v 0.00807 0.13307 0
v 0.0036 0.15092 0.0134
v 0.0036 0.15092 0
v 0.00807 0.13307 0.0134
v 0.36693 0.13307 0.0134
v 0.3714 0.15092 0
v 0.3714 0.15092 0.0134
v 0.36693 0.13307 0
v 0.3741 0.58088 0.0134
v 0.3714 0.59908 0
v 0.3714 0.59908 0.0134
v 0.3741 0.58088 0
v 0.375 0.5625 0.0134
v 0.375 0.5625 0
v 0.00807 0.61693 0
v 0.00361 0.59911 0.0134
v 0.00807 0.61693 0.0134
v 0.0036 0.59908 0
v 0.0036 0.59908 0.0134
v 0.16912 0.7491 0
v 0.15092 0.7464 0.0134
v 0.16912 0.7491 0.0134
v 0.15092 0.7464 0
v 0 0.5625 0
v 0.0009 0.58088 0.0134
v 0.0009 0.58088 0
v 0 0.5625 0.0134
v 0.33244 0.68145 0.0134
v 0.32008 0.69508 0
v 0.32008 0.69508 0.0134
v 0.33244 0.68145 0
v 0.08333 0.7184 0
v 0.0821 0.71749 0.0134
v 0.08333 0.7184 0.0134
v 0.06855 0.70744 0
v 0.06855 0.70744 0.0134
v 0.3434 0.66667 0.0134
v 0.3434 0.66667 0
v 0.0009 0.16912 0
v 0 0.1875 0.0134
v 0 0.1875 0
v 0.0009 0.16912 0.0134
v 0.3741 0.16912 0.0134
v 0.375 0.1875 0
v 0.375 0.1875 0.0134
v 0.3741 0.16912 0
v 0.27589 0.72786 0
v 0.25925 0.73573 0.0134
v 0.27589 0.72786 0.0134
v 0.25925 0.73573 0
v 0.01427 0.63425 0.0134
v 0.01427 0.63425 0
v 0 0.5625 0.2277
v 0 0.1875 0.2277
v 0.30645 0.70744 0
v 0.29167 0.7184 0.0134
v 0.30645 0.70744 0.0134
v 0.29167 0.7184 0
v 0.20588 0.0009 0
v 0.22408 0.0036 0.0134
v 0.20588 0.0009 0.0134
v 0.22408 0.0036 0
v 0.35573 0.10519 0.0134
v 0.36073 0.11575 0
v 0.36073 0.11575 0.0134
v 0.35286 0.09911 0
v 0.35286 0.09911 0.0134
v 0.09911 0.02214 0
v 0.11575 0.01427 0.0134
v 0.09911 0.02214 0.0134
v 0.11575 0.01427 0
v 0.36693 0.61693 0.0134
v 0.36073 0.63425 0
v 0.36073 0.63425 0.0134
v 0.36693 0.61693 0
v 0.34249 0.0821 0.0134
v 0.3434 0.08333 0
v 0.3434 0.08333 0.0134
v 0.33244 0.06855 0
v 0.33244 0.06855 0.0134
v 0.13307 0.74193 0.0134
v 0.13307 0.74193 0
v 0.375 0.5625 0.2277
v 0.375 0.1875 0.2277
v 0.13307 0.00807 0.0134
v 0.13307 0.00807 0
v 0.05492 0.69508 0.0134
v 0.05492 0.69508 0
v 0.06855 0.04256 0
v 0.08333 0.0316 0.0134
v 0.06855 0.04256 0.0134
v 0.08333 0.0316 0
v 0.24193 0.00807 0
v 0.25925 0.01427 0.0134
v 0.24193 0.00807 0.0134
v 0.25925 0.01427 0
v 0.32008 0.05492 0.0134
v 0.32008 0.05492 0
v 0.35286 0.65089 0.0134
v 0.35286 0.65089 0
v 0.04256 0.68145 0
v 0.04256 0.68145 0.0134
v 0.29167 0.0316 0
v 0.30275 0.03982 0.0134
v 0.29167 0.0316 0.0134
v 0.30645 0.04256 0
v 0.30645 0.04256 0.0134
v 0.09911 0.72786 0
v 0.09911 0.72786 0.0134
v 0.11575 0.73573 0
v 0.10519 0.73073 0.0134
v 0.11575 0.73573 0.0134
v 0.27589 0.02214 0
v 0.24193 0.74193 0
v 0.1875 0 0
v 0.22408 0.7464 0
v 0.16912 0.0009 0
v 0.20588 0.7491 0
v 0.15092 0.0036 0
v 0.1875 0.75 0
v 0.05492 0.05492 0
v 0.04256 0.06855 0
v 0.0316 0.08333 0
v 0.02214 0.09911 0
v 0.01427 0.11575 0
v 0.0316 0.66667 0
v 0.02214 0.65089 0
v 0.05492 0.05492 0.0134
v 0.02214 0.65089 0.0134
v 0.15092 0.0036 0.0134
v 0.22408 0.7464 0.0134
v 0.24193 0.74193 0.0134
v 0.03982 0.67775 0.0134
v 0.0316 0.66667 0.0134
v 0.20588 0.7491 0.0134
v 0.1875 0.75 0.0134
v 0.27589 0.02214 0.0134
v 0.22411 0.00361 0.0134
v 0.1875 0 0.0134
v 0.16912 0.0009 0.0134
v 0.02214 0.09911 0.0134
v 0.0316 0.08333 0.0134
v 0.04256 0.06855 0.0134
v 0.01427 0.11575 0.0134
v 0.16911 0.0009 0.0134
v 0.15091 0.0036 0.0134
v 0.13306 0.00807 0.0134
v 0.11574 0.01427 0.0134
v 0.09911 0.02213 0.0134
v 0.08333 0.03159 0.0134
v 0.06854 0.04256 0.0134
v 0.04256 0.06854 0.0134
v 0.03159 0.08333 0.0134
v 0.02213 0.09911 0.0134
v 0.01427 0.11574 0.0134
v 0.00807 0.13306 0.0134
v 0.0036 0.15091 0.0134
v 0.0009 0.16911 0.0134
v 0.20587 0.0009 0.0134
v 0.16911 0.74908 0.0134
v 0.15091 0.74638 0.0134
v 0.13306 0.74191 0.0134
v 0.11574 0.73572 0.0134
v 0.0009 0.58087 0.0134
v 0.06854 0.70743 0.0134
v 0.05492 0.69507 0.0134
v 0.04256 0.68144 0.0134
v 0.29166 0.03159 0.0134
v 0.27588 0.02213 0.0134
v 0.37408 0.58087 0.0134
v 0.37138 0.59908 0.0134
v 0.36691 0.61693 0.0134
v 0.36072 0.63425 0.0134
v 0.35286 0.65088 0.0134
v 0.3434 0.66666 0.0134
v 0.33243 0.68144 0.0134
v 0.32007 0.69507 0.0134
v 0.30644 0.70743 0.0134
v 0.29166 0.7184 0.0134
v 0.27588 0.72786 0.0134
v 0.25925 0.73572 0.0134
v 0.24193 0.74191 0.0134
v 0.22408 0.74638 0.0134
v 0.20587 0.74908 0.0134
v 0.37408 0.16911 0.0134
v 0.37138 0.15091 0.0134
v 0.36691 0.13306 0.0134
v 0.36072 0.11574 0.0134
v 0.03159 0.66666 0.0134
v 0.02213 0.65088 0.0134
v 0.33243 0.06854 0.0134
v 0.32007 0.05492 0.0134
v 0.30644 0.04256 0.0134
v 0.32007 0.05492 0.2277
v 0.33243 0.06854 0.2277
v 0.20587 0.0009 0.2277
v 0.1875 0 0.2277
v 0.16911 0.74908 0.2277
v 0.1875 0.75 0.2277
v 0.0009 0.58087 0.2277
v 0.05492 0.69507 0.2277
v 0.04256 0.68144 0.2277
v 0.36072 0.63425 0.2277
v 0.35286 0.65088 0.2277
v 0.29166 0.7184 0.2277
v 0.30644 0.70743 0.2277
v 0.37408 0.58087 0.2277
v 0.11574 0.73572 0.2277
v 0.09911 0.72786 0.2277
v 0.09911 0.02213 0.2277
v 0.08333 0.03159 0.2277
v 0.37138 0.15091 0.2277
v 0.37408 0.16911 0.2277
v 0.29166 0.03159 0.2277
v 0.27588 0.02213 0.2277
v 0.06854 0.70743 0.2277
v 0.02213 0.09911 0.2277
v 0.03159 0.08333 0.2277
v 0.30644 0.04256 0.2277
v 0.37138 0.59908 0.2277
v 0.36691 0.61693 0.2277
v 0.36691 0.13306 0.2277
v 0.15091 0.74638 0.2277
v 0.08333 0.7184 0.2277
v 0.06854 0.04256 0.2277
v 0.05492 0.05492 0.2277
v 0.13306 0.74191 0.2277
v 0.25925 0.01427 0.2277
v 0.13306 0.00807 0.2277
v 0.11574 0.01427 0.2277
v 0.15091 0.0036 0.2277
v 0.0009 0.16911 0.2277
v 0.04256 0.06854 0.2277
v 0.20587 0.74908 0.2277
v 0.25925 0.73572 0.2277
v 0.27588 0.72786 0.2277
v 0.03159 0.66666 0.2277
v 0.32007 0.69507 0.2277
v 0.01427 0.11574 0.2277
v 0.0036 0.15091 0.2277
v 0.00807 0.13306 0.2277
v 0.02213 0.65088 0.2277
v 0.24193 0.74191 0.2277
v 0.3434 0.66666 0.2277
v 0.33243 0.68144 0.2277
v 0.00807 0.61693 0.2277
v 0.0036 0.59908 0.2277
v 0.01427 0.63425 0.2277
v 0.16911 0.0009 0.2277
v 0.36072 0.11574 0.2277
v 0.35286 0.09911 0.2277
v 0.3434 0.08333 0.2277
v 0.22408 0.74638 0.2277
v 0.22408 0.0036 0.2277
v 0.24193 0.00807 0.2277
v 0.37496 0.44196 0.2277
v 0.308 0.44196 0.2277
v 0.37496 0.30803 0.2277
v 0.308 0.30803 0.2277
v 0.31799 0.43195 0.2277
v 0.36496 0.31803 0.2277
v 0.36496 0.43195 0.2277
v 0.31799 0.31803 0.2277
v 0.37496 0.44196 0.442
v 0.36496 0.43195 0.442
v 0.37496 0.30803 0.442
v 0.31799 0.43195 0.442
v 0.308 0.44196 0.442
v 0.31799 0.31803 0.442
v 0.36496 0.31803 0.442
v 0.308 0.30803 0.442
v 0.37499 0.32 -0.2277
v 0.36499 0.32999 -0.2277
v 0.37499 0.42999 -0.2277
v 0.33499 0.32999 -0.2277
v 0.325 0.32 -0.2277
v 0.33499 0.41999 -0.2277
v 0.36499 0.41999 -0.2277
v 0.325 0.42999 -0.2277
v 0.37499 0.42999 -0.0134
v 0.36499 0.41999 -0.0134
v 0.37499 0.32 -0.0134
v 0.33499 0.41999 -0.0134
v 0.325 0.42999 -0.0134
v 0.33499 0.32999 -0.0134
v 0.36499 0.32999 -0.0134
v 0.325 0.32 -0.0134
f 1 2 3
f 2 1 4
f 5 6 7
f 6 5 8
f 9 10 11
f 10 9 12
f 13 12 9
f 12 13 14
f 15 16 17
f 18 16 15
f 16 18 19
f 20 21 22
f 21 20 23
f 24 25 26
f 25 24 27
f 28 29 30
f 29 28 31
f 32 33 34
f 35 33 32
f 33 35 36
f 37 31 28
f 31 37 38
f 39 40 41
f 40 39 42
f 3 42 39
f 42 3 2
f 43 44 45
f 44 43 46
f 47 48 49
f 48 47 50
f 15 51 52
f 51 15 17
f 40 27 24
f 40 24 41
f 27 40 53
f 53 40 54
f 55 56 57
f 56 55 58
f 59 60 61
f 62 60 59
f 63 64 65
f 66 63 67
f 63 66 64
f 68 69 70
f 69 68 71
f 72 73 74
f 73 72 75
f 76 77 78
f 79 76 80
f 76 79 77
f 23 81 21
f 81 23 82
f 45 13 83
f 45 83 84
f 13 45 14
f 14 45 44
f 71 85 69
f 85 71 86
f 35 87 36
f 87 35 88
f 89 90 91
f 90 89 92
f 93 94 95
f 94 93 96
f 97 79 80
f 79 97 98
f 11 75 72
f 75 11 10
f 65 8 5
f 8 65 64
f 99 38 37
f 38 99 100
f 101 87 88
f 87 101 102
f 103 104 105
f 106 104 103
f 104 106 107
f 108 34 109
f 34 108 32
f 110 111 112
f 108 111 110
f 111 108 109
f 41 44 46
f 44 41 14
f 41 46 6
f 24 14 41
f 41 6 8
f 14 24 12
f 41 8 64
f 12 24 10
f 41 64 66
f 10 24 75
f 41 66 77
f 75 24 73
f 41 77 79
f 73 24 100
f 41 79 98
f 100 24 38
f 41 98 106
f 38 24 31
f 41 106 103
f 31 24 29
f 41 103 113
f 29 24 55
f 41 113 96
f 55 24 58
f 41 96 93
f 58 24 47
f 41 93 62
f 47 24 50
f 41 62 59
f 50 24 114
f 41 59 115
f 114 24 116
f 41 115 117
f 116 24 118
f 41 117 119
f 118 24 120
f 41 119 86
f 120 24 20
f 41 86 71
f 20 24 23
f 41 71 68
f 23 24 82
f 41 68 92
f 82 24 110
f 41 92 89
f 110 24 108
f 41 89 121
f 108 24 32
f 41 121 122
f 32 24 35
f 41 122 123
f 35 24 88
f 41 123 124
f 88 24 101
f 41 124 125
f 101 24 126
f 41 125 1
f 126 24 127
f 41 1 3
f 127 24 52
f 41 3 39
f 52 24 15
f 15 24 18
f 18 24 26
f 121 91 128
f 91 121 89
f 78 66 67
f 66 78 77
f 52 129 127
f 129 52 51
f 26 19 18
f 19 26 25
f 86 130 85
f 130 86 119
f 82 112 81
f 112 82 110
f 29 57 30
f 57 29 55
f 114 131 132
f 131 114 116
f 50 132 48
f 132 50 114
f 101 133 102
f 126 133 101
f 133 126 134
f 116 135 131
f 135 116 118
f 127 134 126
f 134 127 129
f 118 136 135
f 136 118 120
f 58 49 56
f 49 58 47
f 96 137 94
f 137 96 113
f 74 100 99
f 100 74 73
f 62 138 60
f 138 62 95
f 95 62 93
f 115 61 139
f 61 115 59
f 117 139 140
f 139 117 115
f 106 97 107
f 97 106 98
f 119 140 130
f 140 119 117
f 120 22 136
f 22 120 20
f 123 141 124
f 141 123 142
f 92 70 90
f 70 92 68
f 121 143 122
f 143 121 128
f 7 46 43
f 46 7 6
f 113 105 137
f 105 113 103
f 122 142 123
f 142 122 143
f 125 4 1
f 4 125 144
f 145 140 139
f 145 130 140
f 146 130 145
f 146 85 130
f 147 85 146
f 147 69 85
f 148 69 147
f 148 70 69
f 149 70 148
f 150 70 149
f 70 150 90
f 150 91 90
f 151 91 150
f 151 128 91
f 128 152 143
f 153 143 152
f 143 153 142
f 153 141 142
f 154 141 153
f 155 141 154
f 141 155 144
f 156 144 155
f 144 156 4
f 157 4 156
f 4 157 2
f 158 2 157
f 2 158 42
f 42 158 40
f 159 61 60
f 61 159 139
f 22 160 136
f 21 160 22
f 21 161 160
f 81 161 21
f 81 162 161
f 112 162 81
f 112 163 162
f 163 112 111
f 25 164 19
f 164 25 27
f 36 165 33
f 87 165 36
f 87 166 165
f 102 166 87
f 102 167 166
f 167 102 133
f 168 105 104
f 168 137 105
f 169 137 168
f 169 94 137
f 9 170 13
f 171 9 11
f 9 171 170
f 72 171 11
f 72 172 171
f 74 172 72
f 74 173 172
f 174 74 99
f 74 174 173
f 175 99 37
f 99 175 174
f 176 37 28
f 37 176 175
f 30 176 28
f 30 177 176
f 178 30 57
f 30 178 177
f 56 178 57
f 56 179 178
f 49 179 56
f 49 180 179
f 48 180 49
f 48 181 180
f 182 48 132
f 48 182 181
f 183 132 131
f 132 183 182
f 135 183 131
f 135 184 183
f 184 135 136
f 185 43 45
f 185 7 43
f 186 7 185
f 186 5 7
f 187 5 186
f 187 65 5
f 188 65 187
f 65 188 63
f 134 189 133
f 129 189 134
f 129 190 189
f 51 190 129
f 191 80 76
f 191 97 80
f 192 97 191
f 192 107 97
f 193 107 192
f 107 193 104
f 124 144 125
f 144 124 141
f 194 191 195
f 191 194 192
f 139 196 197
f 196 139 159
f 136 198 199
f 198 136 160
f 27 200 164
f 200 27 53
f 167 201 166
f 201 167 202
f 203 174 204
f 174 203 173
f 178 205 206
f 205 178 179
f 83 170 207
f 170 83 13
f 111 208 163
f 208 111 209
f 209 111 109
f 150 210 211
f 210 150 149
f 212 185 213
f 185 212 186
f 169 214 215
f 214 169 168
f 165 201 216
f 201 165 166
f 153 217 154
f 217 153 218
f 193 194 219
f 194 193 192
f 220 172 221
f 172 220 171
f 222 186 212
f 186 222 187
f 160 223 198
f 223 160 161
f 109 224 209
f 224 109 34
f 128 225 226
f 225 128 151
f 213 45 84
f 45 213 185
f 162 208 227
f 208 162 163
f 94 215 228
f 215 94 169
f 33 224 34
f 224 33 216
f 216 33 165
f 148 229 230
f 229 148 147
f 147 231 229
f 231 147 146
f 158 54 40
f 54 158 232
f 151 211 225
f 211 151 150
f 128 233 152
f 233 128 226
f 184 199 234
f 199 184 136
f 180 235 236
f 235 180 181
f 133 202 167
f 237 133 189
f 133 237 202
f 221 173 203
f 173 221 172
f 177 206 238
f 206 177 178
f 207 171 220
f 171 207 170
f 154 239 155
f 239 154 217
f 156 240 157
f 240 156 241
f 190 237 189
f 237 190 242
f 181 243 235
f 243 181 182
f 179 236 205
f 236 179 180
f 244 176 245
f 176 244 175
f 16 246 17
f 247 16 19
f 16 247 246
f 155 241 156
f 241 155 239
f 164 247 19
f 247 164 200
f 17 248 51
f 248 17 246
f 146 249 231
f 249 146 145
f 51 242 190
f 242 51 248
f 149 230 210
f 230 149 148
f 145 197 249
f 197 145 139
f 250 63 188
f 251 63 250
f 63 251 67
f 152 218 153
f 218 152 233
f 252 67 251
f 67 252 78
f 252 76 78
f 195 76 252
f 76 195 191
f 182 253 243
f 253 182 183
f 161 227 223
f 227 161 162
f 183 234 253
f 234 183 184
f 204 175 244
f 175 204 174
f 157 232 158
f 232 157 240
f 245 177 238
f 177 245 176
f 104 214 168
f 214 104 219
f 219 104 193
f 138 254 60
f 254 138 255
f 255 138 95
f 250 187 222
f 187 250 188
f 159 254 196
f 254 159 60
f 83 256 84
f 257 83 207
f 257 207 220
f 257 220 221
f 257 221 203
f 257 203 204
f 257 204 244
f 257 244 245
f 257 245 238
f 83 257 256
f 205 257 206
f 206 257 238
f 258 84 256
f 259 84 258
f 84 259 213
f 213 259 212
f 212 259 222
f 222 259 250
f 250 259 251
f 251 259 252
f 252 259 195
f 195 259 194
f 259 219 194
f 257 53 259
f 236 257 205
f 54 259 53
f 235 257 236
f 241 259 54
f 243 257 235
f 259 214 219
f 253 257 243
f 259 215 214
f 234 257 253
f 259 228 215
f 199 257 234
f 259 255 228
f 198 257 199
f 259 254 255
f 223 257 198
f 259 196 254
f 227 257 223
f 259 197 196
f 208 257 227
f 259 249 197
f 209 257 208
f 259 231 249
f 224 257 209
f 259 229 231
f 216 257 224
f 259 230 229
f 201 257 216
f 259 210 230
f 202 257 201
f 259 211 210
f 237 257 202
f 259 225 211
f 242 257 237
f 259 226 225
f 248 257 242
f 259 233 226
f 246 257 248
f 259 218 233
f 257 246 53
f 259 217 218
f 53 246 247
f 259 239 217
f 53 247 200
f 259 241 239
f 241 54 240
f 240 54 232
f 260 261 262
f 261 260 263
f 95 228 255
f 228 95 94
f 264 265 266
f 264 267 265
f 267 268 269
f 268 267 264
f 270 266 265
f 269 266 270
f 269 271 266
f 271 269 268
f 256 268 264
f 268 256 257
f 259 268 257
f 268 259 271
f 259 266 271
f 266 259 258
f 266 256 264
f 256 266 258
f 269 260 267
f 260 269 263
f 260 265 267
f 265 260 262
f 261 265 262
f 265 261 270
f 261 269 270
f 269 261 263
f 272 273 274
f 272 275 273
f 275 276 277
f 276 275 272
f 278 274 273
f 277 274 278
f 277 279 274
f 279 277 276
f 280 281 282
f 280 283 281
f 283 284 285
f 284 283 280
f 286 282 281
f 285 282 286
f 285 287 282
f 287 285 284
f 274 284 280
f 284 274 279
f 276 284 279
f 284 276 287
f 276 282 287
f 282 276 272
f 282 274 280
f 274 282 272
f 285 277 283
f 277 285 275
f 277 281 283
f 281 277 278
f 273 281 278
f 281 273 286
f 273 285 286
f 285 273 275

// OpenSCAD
// Global Resolution Setting
$fn = 64;

// ==============================
// All Parametric Dimensions
// ==============================
// Base Footprint Specifications
base_len = 0.375;          // Total X dimension of base footprint
base_wid = 0.75;           // Total Y dimension of base footprint
base_corner_r = base_len/2;// Radius for rounded stadium ends
base_thickness = 0.0134;   // Thickness of lower solid base plate

// Upper Perimeter Wall Specifications
main_wall_total_reach = 0.2277;  // Max Z height from base datum (Z=0)
main_wall_thickness = 0.02;      // Wall thickness of upper perimeter
main_wall_height = main_wall_total_reach - base_thickness;

// Raised Upper Sleeve Specifications
sleeve_offset_left = 0.308;      // Offset from base left edge
sleeve_outer_len = 0.066964;     // Sleeve X dimension
sleeve_outer_wid = 0.133929;     // Sleeve Y dimension
sleeve_total_reach = 0.442;      // Max Z height from base datum
sleeve_height = sleeve_total_reach - main_wall_total_reach;
sleeve_wall_thickness = 0.01;    // Wall thickness of hollow sleeve

// Lower Sleeve Continuation Specifications
lower_sleeve_outer_len = 0.05;   // X dimension (fits inside upper sleeve)
lower_sleeve_outer_wid = 0.11;   // Y dimension (fits inside upper sleeve)
lower_sleeve_depth = 0.2143;     // Extrusion depth below base
lower_sleeve_top_z = -0.0134;    // Top Z position (0.0134 below base)

// Circular Cut Hole Specifications
hole_r = 0.0067;                 // Hole radius
hole_x_pos = 0.3616;             // Shared X position for both holes
hole_y_pos1 = 0.6828;            // Y position of upper hole
hole_y_pos2 = 0.0672;            // Y position of lower hole
hole_z_start = 0.1674;           // Start Z height of cuts
hole_z_end = 0.1808;             // End Z height of cuts
hole_height = hole_z_end - hole_z_start;

// ==============================
// Helper Module Definitions
// ==============================
// Generate 2D stadium/rounded footprint for base
module base_footprint(filled=true, wall_thickness=0) {
    hull() {
        translate([base_len/2, base_corner_r, 0]) circle(r=base_corner_r);
        translate([base_len/2, base_wid - base_corner_r, 0]) circle(r=base_corner_r);
    }
    if (!filled) {
        difference() {
            children();
            offset(r=-wall_thickness) children();
        }
    }
}

// Generate 2D hollow rectangular footprint for sleeves
module sleeve_footprint(outer_len, outer_wid, wall_thickness) {
    difference() {
        square([outer_len, outer_wid]);
        translate([wall_thickness, wall_thickness, 0])
            square([outer_len - 2*wall_thickness, outer_wid - 2*wall_thickness]);
    }
}

// ==============================
// Main Model Assembly
// ==============================
difference() {
    union() {
        // Lower solid base plate
        linear_extrude(height=base_thickness)
            base_footprint(filled=true);
        
        // Upper perimeter wall (hollow inner region)
        translate([0, 0, base_thickness])
            linear_extrude(height=main_wall_height)
                base_footprint(filled=false, wall_thickness=main_wall_thickness);
        
        // Raised hollow upper sleeve
        translate([sleeve_offset_left, (base_wid - sleeve_outer_wid)/2, main_wall_total_reach])
            linear_extrude(height=sleeve_height)
                sleeve_footprint(sleeve_outer_len, sleeve_outer_wid, sleeve_wall_thickness);
        
        // Lower hollow sleeve continuation
        translate([base_len - lower_sleeve_outer_len, (base_wid - lower_sleeve_outer_wid)/2, lower_sleeve_top_z - lower_sleeve_depth])
            linear_extrude(height=lower_sleeve_depth)
                sleeve_footprint(lower_sleeve_outer_len, lower_sleeve_outer_wid, sleeve_wall_thickness);
    }

    // Cut pair of circular holes
    translate([hole_x_pos, hole_y_pos1, hole_z_start])
        cylinder(r=hole_r, h=hole_height);
    translate([hole_x_pos, hole_y_pos2, hole_z_start])
        cylinder(r=hole_r, h=hole_height);
}
